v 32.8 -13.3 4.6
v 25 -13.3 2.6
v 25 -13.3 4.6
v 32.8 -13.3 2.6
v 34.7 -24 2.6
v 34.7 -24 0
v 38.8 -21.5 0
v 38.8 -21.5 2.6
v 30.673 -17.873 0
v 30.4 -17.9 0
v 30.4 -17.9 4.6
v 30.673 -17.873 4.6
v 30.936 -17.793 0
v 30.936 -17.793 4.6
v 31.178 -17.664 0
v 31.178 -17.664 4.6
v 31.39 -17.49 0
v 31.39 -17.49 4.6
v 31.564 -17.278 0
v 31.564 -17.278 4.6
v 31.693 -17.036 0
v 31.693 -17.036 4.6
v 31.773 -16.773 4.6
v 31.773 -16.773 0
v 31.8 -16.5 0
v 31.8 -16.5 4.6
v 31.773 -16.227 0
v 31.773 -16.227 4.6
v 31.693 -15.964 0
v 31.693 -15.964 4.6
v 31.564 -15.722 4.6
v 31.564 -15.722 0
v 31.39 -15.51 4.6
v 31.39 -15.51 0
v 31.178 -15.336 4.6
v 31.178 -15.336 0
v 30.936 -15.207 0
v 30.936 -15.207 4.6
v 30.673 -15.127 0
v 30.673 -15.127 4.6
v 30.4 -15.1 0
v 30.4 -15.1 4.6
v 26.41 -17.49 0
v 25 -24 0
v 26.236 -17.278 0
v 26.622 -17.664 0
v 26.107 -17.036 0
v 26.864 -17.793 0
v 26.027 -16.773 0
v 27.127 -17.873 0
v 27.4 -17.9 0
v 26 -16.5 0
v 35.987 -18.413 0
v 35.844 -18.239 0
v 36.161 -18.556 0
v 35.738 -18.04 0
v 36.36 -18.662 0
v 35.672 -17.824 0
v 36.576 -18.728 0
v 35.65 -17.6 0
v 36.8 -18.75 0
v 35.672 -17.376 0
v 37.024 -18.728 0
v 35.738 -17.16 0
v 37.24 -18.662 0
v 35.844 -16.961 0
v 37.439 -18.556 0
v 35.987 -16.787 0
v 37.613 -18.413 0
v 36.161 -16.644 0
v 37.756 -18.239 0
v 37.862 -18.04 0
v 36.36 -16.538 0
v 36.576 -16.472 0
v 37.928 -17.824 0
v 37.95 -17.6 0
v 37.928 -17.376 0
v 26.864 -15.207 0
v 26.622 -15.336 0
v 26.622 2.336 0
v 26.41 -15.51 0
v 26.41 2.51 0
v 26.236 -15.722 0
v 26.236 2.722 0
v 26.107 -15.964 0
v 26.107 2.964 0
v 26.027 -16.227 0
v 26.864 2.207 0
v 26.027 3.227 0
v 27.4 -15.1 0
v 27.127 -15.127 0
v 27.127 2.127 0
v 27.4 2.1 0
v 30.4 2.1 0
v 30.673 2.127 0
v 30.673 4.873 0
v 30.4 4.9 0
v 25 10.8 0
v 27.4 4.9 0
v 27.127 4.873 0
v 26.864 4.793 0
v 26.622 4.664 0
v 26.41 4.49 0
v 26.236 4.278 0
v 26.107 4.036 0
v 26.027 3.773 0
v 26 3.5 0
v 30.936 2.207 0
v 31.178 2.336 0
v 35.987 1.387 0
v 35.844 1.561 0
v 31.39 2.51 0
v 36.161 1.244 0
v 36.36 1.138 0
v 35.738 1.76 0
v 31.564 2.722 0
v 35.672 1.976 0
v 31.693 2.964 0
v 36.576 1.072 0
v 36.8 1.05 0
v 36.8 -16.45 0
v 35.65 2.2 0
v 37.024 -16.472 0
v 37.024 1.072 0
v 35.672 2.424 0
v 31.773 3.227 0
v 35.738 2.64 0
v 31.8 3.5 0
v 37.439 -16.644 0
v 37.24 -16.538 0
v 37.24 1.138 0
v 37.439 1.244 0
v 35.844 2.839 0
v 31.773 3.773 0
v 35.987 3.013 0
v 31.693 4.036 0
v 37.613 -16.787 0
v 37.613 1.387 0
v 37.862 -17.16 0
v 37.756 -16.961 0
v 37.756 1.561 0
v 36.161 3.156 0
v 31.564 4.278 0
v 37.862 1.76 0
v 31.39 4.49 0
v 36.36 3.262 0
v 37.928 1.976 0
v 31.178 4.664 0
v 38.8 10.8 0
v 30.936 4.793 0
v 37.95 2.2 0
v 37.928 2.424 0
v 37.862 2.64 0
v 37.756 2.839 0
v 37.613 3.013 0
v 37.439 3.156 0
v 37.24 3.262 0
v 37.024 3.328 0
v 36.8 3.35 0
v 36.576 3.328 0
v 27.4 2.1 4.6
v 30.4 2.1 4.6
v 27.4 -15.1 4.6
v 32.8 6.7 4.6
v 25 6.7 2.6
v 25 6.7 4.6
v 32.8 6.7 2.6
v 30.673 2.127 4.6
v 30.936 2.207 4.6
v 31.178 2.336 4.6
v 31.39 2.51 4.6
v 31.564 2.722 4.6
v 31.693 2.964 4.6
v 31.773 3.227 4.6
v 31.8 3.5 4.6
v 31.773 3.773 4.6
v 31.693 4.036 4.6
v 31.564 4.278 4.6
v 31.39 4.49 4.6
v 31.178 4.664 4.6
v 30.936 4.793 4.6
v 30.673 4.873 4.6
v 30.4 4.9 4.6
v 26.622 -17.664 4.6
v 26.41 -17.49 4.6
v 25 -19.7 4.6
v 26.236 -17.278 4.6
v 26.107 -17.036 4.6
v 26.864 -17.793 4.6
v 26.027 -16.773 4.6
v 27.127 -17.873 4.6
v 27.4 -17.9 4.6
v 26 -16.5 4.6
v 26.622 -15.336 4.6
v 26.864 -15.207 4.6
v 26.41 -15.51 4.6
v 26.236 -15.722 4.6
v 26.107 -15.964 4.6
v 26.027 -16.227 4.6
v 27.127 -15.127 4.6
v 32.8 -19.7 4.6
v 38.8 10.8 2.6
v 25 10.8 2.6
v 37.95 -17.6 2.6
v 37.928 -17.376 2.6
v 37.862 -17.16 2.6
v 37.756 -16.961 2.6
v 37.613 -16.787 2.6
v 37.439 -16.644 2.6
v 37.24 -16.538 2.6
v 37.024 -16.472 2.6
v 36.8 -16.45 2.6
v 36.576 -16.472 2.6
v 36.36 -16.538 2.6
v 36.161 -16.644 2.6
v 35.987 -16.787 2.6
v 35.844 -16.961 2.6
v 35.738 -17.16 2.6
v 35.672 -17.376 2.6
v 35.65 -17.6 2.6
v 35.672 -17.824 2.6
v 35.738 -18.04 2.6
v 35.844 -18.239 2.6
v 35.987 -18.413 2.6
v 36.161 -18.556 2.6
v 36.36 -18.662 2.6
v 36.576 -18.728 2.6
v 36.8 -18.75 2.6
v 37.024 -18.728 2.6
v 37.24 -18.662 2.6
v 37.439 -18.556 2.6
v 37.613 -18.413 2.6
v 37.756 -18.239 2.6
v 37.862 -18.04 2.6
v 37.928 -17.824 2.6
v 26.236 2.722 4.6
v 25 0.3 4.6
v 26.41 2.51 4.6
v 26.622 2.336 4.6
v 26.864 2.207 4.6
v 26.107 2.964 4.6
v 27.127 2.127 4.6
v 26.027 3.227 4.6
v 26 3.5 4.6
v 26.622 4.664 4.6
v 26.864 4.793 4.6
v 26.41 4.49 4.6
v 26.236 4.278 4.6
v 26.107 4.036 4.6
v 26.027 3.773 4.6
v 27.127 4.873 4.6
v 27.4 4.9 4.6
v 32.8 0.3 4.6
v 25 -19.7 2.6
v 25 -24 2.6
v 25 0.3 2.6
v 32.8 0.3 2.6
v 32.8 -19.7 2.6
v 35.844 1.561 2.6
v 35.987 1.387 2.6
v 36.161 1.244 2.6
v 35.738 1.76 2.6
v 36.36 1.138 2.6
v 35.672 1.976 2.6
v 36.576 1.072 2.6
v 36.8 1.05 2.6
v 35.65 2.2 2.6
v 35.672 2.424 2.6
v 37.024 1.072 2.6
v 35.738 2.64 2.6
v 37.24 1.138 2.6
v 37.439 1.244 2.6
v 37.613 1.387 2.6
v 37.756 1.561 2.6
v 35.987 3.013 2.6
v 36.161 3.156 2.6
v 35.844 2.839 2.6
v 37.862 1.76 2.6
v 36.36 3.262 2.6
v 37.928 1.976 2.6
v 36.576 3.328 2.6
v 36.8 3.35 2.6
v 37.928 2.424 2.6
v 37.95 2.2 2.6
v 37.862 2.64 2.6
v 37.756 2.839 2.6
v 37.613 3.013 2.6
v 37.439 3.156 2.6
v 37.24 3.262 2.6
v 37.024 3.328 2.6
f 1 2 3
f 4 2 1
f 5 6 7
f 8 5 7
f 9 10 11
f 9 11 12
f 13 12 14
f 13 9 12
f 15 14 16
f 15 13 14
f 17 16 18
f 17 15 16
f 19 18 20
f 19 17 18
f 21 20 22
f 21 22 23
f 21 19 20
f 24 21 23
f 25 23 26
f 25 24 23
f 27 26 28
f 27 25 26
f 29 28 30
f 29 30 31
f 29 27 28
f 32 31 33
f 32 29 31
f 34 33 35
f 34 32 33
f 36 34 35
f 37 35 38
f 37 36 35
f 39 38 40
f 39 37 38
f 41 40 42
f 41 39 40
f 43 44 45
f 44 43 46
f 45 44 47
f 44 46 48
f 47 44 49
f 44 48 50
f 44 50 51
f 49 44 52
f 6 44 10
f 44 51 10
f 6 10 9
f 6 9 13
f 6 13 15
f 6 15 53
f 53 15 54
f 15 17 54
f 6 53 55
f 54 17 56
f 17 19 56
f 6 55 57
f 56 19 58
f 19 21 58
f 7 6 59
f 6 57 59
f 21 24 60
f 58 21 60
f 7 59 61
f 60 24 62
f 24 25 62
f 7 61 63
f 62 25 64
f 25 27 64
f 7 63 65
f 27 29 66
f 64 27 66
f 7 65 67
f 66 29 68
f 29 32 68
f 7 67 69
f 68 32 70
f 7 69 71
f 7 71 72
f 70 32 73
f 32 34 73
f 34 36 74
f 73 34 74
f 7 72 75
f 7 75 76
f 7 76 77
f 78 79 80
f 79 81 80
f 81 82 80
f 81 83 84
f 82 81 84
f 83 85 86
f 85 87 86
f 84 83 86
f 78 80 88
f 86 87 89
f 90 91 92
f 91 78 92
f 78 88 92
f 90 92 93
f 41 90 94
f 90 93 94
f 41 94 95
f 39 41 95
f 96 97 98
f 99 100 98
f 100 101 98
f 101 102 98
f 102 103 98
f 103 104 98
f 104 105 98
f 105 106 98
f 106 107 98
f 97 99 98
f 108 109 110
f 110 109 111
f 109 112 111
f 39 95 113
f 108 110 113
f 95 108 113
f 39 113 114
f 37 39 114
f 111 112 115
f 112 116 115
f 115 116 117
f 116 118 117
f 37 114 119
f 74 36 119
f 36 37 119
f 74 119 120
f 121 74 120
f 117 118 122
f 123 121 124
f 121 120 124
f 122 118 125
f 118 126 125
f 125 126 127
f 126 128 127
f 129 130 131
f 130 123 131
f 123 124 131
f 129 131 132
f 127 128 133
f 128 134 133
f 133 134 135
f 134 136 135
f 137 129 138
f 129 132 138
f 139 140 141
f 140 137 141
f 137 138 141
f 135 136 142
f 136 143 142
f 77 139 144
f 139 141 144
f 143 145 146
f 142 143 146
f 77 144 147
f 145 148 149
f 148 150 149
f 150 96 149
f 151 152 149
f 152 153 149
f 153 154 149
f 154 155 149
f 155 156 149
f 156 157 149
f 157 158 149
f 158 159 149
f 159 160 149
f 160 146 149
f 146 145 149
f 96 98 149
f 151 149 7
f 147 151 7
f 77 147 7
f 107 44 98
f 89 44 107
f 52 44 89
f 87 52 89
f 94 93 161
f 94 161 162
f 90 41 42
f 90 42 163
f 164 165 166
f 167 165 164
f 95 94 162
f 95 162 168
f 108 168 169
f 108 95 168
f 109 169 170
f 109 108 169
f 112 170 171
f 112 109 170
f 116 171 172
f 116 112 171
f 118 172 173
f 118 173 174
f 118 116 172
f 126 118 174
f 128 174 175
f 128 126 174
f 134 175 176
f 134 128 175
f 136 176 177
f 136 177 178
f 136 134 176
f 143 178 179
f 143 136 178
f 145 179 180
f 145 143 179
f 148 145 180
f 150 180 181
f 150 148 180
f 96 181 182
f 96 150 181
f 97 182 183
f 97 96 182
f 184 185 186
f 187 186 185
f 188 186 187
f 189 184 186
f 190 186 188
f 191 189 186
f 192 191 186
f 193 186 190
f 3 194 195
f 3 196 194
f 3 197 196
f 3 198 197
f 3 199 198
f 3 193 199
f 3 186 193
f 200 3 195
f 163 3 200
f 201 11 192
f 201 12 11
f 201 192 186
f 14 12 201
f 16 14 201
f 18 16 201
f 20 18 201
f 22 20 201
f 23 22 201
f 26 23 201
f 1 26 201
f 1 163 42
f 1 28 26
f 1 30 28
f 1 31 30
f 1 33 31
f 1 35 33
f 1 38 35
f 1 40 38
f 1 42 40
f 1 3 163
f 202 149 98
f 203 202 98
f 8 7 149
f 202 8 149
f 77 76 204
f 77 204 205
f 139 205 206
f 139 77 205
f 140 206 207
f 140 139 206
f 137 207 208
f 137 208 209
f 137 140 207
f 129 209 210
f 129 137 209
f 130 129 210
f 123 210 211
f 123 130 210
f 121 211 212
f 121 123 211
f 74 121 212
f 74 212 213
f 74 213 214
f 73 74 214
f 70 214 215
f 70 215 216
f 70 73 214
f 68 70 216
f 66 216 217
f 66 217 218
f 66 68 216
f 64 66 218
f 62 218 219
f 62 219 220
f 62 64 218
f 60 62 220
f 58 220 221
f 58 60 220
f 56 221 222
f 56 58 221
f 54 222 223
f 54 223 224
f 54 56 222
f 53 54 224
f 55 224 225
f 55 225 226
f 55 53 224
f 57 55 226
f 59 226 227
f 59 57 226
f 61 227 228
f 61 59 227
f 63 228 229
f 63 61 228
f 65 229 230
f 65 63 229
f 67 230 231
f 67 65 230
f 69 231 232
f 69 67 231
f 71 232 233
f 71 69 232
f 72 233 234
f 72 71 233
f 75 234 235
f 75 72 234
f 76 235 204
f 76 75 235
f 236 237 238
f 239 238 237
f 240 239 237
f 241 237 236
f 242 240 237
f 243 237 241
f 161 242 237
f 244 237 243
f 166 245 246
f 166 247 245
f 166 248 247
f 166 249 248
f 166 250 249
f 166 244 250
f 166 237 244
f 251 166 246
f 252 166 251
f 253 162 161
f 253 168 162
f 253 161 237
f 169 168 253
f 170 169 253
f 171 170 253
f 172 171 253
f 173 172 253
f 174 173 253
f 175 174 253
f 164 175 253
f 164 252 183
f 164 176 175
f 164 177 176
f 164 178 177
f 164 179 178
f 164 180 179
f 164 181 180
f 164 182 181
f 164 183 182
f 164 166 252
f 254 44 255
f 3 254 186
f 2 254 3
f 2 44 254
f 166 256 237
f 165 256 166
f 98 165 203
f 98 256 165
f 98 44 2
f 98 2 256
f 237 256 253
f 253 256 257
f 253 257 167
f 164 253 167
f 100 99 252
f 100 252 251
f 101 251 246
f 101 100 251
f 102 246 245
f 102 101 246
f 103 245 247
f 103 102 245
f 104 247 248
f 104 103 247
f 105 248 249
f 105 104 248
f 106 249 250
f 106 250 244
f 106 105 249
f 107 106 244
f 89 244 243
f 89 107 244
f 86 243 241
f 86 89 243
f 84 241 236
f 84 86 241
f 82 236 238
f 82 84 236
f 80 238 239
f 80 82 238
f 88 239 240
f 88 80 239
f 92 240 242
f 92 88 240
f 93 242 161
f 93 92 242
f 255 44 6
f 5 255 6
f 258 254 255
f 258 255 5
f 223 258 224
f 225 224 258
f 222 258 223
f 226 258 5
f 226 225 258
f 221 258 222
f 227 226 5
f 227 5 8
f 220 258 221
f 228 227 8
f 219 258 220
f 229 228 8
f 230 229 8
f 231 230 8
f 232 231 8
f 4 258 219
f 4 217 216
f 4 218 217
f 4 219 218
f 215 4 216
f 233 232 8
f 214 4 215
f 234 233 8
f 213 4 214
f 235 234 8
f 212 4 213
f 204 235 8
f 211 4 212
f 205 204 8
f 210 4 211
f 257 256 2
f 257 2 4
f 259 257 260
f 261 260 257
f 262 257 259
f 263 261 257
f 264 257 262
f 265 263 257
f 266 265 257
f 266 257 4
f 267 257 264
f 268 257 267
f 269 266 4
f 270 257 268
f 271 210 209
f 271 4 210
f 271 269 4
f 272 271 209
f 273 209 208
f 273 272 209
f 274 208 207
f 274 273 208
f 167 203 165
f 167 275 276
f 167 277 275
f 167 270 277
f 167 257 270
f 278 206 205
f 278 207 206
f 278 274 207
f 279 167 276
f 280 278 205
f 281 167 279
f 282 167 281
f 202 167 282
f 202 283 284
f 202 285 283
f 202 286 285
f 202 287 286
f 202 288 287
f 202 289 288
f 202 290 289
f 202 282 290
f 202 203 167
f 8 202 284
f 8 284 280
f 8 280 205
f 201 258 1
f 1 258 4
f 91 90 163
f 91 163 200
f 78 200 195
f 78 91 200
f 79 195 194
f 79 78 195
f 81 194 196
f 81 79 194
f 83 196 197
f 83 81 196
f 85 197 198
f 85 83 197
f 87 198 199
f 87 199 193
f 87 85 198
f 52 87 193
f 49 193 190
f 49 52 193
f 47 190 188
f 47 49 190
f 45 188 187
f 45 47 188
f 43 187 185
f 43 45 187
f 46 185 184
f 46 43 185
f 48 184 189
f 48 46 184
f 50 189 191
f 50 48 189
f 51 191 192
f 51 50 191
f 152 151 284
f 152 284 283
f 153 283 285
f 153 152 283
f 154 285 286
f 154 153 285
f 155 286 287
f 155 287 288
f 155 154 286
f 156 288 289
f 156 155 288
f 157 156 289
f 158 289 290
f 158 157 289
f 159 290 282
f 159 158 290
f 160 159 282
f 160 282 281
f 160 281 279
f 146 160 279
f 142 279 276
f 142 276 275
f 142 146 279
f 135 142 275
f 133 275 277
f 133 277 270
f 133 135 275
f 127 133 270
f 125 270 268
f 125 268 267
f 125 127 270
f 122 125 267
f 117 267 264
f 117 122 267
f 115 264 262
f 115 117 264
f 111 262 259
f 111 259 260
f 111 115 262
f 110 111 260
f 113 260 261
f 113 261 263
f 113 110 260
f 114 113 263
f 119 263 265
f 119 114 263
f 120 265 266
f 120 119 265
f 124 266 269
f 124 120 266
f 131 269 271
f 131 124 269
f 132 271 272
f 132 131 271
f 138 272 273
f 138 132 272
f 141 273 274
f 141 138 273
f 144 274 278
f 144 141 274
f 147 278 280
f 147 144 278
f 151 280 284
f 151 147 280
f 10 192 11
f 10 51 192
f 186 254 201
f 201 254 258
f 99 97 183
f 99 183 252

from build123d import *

# Parameters (mm, degrees)
OPPOSITE_END_CROSSBAR_WITH_TWO_ADJUS_2_R       = 1.15
OPPOSITE_END_CROSSBAR_WITH_TWO_ADJUSTABL_DEPTH = 2.6
TWO_START                                      = 2.6
TWO_RAISED_PCB_BOLT_PADS_PROFILE_W             = 7.8
TWO_RAISED_PCB_BOLT_PADS_PROFILE_H             = 6.4
TWO_RAISED_PCB_BOLT_PADS_DEPTH                 = 2


with BuildPart() as part:
    # Opposite end crossbar with two adjus 2 → Opposite end crossbar with two adjustabl (new body)
    with BuildSketch(Plane.XY):
        Polygon((25, -24), (34.7, -24), (38.8, -21.5), (38.8, 10.8), (25, 10.8), align=None)
        with Locations((36.8, -17.6)):
            Circle(OPPOSITE_END_CROSSBAR_WITH_TWO_ADJUS_2_R, mode=Mode.SUBTRACT)
        with Locations((36.8, 2.2)):
            Circle(OPPOSITE_END_CROSSBAR_WITH_TWO_ADJUS_2_R, mode=Mode.SUBTRACT)
        with BuildLine():
            Line((27.4, -17.9), (30.4, -17.9))
            ThreePointArc((30.4, -17.9), (31.8, -16.5), (30.4, -15.1))
            Line((30.4, -15.1), (27.4, -15.1))
            ThreePointArc((27.4, -15.1), (26, -16.5), (27.4, -17.9))
        make_face(mode=Mode.SUBTRACT)
        with BuildLine():
            Line((27.4, 2.1), (30.4, 2.1))
            ThreePointArc((30.4, 2.1), (31.8, 3.5), (30.4, 4.9))
            Line((30.4, 4.9), (27.4, 4.9))
            ThreePointArc((27.4, 4.9), (26, 3.5), (27.4, 2.1))
        make_face(mode=Mode.SUBTRACT)
    extrude(amount=OPPOSITE_END_CROSSBAR_WITH_TWO_ADJUSTABL_DEPTH)

    # Two raised PCB bolt pads profile → Two raised PCB bolt pads (add)
    # profile 1 of 2: a face of its own
    with BuildSketch(Plane.XY.offset(TWO_START)):
        with Locations((28.9, -16.5)):
            Rectangle(TWO_RAISED_PCB_BOLT_PADS_PROFILE_W, TWO_RAISED_PCB_BOLT_PADS_PROFILE_H)
        with BuildLine():
            Line((27.4, -17.9), (30.4, -17.9))
            ThreePointArc((30.4, -17.9), (31.8, -16.5), (30.4, -15.1))
            Line((30.4, -15.1), (27.4, -15.1))
            ThreePointArc((27.4, -15.1), (26, -16.5), (27.4, -17.9))
        make_face(mode=Mode.SUBTRACT)
    # profile 2 of 2: a face of its own
    with BuildSketch(Plane.XY.offset(TWO_START)):
        with Locations((28.9, 3.5)):
            Rectangle(TWO_RAISED_PCB_BOLT_PADS_PROFILE_W, TWO_RAISED_PCB_BOLT_PADS_PROFILE_H)
        with BuildLine():
            Line((27.4, 2.1), (30.4, 2.1))
            ThreePointArc((30.4, 2.1), (31.8, 3.5), (30.4, 4.9))
            Line((30.4, 4.9), (27.4, 4.9))
            ThreePointArc((27.4, 4.9), (26, 3.5), (27.4, 2.1))
        make_face(mode=Mode.SUBTRACT)
    extrude(amount=TWO_RAISED_PCB_BOLT_PADS_DEPTH)


solid = part.part
